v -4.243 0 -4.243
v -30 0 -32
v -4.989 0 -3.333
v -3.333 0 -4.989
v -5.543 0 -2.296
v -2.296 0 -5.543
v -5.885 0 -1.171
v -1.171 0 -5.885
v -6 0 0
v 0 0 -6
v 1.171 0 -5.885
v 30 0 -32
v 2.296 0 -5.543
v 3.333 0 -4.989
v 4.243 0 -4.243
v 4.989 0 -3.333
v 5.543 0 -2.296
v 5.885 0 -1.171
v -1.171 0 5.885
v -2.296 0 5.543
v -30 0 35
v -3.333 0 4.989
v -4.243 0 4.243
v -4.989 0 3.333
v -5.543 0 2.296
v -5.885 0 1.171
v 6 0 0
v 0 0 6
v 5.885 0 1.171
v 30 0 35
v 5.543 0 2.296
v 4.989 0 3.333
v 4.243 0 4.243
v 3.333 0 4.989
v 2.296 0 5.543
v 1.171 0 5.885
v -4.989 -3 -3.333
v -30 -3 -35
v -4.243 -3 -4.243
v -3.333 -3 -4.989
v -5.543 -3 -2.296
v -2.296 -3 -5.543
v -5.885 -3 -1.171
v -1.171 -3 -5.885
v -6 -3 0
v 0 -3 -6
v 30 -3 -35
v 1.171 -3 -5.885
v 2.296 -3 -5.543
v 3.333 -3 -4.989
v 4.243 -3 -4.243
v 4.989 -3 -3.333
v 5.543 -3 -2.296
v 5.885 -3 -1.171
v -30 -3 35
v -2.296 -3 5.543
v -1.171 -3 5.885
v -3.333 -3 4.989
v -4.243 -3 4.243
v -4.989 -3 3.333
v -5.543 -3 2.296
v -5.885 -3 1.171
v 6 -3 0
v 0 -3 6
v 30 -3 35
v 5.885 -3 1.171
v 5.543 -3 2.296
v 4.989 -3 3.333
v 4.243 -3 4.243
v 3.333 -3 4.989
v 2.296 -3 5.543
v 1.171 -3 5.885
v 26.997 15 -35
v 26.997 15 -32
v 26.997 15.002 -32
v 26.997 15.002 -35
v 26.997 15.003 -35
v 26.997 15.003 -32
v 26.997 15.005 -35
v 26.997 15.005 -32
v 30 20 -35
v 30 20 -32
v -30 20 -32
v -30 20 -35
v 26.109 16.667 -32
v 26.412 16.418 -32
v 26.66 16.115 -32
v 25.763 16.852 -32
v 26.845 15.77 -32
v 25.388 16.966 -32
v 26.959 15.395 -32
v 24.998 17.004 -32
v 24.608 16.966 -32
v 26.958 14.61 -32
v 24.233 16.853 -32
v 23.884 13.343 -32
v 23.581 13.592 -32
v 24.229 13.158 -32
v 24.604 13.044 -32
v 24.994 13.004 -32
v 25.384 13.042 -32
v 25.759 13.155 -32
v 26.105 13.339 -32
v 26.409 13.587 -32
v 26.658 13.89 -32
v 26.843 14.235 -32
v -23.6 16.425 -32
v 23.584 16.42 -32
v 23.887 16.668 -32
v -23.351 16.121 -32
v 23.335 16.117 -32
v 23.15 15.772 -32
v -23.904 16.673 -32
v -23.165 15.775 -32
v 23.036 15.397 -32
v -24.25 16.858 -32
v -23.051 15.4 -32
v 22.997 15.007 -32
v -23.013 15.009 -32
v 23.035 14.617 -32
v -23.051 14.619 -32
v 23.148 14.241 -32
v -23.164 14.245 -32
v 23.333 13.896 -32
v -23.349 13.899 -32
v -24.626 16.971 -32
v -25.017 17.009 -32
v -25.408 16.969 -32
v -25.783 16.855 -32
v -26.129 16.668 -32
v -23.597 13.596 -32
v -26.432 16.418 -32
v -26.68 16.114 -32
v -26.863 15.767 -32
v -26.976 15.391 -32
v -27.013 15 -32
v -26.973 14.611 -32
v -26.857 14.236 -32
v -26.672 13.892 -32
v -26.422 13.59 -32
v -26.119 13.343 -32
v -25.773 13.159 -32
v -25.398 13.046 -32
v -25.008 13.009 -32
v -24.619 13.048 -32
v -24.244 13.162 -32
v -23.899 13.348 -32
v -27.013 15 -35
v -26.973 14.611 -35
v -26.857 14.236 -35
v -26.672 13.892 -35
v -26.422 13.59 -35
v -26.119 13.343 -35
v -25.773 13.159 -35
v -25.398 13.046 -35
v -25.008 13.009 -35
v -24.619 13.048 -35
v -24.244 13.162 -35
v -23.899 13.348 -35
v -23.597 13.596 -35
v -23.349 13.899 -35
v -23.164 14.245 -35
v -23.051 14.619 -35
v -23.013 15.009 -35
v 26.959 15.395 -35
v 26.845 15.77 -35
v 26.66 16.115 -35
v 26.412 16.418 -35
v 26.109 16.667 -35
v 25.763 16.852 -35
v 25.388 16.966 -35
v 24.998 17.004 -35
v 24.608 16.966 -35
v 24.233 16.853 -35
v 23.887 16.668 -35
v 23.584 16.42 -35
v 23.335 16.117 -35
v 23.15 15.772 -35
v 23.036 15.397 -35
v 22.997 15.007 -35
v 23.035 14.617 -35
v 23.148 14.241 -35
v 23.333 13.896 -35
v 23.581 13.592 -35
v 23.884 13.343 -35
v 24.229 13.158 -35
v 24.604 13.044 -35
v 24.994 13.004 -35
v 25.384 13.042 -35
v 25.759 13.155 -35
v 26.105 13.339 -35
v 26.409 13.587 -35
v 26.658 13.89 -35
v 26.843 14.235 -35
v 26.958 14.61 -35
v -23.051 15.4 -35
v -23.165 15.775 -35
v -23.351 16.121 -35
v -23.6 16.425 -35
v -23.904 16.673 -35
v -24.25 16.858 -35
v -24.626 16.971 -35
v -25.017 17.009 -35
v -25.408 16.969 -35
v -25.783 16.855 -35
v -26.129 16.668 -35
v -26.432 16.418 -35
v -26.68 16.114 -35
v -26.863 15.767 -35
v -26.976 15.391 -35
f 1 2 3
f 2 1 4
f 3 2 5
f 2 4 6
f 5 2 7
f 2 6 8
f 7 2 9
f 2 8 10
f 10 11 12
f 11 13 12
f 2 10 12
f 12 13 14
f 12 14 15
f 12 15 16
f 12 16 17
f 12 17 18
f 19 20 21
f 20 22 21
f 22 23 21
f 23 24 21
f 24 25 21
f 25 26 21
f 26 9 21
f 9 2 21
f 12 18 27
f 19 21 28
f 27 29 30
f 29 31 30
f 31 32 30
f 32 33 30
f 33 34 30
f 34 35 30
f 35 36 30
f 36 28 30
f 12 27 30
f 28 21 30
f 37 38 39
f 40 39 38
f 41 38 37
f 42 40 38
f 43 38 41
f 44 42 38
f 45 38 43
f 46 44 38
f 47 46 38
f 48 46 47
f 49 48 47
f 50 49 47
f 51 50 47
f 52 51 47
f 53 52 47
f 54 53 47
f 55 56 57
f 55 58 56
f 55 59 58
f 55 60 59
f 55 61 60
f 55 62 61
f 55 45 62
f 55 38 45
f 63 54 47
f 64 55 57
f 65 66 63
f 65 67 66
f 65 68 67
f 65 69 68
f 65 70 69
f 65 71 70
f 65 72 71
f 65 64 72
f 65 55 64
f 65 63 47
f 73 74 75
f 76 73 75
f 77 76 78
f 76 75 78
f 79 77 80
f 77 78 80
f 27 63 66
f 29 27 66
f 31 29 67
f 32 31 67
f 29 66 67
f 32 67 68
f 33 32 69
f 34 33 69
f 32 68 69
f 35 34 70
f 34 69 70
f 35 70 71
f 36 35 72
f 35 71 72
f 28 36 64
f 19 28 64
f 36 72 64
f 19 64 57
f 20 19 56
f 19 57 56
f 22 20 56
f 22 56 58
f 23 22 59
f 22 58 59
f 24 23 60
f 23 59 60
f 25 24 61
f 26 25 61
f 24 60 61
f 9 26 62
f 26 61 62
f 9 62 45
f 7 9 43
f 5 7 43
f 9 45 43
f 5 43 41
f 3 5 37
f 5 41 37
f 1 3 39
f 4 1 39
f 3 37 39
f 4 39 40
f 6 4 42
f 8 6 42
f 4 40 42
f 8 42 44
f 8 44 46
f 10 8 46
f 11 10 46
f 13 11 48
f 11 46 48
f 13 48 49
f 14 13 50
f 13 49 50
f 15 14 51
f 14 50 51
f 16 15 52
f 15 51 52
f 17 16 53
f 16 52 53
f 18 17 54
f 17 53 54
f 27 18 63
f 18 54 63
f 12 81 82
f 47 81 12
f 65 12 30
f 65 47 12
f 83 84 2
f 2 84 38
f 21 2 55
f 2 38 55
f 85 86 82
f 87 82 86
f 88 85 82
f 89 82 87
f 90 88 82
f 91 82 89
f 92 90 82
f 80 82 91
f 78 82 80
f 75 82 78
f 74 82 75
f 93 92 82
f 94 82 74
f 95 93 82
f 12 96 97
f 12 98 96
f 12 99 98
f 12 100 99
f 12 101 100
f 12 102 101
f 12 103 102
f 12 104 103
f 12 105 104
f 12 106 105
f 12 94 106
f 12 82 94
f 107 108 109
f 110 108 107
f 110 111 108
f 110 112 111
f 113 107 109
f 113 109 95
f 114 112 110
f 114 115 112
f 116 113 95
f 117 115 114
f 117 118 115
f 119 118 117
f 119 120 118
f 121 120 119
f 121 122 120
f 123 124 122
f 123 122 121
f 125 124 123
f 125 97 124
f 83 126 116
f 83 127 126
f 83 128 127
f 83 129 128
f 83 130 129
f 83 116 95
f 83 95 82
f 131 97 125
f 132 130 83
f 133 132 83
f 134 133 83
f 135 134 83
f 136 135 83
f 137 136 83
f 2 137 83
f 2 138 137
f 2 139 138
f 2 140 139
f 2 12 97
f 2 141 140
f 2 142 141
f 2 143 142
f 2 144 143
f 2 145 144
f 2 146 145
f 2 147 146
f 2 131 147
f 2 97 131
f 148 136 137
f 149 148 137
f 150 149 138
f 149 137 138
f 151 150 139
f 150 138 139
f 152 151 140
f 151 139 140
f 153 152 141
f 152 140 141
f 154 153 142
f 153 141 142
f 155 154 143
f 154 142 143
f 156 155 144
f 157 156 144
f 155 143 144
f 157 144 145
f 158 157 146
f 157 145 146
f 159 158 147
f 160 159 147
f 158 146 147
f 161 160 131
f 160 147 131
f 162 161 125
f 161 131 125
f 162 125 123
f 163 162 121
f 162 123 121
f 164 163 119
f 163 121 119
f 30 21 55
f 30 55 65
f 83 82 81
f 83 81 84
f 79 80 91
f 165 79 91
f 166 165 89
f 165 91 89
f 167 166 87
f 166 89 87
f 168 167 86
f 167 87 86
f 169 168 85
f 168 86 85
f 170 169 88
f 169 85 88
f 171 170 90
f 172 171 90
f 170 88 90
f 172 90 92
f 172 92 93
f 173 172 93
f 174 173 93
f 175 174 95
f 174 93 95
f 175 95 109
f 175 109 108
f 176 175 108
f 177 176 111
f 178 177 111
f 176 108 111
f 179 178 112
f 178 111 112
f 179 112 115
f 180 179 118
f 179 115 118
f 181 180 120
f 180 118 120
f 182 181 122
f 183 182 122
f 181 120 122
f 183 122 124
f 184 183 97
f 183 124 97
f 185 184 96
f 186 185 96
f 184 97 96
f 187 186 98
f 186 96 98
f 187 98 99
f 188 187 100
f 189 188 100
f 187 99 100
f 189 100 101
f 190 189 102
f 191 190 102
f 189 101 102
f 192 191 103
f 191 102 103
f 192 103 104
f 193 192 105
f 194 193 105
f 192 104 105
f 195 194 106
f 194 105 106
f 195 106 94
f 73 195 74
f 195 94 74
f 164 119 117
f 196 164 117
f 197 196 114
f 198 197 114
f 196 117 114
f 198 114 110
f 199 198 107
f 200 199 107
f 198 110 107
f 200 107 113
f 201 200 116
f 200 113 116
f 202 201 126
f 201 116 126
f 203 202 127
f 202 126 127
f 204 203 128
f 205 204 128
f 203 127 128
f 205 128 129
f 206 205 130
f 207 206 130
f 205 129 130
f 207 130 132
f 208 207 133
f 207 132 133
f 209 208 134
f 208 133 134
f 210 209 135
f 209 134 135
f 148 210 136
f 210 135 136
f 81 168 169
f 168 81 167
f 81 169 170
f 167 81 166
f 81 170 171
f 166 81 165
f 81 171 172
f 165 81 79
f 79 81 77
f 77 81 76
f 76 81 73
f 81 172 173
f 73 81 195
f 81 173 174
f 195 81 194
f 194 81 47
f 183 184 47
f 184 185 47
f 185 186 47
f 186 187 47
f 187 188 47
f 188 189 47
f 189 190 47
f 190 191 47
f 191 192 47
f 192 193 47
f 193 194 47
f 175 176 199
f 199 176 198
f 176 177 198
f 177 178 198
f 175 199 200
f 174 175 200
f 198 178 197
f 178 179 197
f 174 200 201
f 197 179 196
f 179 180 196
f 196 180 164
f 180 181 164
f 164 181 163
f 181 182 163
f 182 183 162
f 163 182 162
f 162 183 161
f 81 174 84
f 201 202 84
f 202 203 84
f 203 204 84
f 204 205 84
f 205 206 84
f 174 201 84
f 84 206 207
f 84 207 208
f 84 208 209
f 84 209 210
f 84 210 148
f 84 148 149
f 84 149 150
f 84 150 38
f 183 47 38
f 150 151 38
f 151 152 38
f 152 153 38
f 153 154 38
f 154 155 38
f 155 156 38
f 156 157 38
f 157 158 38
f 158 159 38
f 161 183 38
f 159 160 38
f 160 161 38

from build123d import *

# Parameters (mm, degrees)
F0_W     = 60
F0_H     = 70
F1_DEPTH = 3
F2_W     = 60
F2_H     = 3
F3_DEPTH = 20
F5_DEPTH = 3
F6_R     = 6
F7_DEPTH = 3


with BuildPart() as f1:
    # F0 (on Front) → F1 (new body)
    with BuildSketch(Plane.XZ):
        Rectangle(F0_W, F0_H)
    extrude(amount=F1_DEPTH)

    # F2 (on face) → F3 (join)
    with BuildSketch(Plane(origin=(0, 0, 0), x_dir=(-1, 0, 0), z_dir=(0, 1, 0))):
        with Locations((0, -33.5)):
            Rectangle(F2_W, F2_H)
    extrude(amount=F3_DEPTH)

    # F4 (on face) → F5 (cut)
    with BuildSketch(Plane.XY.offset(-32)):
        with BuildLine():
            ThreePointArc((26.997119, 15.00453), (22.99712, 15.006795), (26.997114, 15))
            ThreePointArc((26.997114, 15), (26.997118, 15.002265), (26.997119, 15.00453))
        make_face()
        with BuildLine():
            ThreePointArc((-23.012635, 15.008898), (-25.017084, 17.008893), (-27.012615, 15))
            ThreePointArc((-27.012615, 15), (-25.008186, 13.008903), (-23.012635, 15.008898))
        make_face()
    extrude(amount=-F5_DEPTH, mode=Mode.SUBTRACT)

    # F6 (on face) → F7 (cut)
    with BuildSketch(Plane.XZ.offset(3)):
        Circle(F6_R)
    extrude(amount=-F7_DEPTH, mode=Mode.SUBTRACT)


solid = f1.part
